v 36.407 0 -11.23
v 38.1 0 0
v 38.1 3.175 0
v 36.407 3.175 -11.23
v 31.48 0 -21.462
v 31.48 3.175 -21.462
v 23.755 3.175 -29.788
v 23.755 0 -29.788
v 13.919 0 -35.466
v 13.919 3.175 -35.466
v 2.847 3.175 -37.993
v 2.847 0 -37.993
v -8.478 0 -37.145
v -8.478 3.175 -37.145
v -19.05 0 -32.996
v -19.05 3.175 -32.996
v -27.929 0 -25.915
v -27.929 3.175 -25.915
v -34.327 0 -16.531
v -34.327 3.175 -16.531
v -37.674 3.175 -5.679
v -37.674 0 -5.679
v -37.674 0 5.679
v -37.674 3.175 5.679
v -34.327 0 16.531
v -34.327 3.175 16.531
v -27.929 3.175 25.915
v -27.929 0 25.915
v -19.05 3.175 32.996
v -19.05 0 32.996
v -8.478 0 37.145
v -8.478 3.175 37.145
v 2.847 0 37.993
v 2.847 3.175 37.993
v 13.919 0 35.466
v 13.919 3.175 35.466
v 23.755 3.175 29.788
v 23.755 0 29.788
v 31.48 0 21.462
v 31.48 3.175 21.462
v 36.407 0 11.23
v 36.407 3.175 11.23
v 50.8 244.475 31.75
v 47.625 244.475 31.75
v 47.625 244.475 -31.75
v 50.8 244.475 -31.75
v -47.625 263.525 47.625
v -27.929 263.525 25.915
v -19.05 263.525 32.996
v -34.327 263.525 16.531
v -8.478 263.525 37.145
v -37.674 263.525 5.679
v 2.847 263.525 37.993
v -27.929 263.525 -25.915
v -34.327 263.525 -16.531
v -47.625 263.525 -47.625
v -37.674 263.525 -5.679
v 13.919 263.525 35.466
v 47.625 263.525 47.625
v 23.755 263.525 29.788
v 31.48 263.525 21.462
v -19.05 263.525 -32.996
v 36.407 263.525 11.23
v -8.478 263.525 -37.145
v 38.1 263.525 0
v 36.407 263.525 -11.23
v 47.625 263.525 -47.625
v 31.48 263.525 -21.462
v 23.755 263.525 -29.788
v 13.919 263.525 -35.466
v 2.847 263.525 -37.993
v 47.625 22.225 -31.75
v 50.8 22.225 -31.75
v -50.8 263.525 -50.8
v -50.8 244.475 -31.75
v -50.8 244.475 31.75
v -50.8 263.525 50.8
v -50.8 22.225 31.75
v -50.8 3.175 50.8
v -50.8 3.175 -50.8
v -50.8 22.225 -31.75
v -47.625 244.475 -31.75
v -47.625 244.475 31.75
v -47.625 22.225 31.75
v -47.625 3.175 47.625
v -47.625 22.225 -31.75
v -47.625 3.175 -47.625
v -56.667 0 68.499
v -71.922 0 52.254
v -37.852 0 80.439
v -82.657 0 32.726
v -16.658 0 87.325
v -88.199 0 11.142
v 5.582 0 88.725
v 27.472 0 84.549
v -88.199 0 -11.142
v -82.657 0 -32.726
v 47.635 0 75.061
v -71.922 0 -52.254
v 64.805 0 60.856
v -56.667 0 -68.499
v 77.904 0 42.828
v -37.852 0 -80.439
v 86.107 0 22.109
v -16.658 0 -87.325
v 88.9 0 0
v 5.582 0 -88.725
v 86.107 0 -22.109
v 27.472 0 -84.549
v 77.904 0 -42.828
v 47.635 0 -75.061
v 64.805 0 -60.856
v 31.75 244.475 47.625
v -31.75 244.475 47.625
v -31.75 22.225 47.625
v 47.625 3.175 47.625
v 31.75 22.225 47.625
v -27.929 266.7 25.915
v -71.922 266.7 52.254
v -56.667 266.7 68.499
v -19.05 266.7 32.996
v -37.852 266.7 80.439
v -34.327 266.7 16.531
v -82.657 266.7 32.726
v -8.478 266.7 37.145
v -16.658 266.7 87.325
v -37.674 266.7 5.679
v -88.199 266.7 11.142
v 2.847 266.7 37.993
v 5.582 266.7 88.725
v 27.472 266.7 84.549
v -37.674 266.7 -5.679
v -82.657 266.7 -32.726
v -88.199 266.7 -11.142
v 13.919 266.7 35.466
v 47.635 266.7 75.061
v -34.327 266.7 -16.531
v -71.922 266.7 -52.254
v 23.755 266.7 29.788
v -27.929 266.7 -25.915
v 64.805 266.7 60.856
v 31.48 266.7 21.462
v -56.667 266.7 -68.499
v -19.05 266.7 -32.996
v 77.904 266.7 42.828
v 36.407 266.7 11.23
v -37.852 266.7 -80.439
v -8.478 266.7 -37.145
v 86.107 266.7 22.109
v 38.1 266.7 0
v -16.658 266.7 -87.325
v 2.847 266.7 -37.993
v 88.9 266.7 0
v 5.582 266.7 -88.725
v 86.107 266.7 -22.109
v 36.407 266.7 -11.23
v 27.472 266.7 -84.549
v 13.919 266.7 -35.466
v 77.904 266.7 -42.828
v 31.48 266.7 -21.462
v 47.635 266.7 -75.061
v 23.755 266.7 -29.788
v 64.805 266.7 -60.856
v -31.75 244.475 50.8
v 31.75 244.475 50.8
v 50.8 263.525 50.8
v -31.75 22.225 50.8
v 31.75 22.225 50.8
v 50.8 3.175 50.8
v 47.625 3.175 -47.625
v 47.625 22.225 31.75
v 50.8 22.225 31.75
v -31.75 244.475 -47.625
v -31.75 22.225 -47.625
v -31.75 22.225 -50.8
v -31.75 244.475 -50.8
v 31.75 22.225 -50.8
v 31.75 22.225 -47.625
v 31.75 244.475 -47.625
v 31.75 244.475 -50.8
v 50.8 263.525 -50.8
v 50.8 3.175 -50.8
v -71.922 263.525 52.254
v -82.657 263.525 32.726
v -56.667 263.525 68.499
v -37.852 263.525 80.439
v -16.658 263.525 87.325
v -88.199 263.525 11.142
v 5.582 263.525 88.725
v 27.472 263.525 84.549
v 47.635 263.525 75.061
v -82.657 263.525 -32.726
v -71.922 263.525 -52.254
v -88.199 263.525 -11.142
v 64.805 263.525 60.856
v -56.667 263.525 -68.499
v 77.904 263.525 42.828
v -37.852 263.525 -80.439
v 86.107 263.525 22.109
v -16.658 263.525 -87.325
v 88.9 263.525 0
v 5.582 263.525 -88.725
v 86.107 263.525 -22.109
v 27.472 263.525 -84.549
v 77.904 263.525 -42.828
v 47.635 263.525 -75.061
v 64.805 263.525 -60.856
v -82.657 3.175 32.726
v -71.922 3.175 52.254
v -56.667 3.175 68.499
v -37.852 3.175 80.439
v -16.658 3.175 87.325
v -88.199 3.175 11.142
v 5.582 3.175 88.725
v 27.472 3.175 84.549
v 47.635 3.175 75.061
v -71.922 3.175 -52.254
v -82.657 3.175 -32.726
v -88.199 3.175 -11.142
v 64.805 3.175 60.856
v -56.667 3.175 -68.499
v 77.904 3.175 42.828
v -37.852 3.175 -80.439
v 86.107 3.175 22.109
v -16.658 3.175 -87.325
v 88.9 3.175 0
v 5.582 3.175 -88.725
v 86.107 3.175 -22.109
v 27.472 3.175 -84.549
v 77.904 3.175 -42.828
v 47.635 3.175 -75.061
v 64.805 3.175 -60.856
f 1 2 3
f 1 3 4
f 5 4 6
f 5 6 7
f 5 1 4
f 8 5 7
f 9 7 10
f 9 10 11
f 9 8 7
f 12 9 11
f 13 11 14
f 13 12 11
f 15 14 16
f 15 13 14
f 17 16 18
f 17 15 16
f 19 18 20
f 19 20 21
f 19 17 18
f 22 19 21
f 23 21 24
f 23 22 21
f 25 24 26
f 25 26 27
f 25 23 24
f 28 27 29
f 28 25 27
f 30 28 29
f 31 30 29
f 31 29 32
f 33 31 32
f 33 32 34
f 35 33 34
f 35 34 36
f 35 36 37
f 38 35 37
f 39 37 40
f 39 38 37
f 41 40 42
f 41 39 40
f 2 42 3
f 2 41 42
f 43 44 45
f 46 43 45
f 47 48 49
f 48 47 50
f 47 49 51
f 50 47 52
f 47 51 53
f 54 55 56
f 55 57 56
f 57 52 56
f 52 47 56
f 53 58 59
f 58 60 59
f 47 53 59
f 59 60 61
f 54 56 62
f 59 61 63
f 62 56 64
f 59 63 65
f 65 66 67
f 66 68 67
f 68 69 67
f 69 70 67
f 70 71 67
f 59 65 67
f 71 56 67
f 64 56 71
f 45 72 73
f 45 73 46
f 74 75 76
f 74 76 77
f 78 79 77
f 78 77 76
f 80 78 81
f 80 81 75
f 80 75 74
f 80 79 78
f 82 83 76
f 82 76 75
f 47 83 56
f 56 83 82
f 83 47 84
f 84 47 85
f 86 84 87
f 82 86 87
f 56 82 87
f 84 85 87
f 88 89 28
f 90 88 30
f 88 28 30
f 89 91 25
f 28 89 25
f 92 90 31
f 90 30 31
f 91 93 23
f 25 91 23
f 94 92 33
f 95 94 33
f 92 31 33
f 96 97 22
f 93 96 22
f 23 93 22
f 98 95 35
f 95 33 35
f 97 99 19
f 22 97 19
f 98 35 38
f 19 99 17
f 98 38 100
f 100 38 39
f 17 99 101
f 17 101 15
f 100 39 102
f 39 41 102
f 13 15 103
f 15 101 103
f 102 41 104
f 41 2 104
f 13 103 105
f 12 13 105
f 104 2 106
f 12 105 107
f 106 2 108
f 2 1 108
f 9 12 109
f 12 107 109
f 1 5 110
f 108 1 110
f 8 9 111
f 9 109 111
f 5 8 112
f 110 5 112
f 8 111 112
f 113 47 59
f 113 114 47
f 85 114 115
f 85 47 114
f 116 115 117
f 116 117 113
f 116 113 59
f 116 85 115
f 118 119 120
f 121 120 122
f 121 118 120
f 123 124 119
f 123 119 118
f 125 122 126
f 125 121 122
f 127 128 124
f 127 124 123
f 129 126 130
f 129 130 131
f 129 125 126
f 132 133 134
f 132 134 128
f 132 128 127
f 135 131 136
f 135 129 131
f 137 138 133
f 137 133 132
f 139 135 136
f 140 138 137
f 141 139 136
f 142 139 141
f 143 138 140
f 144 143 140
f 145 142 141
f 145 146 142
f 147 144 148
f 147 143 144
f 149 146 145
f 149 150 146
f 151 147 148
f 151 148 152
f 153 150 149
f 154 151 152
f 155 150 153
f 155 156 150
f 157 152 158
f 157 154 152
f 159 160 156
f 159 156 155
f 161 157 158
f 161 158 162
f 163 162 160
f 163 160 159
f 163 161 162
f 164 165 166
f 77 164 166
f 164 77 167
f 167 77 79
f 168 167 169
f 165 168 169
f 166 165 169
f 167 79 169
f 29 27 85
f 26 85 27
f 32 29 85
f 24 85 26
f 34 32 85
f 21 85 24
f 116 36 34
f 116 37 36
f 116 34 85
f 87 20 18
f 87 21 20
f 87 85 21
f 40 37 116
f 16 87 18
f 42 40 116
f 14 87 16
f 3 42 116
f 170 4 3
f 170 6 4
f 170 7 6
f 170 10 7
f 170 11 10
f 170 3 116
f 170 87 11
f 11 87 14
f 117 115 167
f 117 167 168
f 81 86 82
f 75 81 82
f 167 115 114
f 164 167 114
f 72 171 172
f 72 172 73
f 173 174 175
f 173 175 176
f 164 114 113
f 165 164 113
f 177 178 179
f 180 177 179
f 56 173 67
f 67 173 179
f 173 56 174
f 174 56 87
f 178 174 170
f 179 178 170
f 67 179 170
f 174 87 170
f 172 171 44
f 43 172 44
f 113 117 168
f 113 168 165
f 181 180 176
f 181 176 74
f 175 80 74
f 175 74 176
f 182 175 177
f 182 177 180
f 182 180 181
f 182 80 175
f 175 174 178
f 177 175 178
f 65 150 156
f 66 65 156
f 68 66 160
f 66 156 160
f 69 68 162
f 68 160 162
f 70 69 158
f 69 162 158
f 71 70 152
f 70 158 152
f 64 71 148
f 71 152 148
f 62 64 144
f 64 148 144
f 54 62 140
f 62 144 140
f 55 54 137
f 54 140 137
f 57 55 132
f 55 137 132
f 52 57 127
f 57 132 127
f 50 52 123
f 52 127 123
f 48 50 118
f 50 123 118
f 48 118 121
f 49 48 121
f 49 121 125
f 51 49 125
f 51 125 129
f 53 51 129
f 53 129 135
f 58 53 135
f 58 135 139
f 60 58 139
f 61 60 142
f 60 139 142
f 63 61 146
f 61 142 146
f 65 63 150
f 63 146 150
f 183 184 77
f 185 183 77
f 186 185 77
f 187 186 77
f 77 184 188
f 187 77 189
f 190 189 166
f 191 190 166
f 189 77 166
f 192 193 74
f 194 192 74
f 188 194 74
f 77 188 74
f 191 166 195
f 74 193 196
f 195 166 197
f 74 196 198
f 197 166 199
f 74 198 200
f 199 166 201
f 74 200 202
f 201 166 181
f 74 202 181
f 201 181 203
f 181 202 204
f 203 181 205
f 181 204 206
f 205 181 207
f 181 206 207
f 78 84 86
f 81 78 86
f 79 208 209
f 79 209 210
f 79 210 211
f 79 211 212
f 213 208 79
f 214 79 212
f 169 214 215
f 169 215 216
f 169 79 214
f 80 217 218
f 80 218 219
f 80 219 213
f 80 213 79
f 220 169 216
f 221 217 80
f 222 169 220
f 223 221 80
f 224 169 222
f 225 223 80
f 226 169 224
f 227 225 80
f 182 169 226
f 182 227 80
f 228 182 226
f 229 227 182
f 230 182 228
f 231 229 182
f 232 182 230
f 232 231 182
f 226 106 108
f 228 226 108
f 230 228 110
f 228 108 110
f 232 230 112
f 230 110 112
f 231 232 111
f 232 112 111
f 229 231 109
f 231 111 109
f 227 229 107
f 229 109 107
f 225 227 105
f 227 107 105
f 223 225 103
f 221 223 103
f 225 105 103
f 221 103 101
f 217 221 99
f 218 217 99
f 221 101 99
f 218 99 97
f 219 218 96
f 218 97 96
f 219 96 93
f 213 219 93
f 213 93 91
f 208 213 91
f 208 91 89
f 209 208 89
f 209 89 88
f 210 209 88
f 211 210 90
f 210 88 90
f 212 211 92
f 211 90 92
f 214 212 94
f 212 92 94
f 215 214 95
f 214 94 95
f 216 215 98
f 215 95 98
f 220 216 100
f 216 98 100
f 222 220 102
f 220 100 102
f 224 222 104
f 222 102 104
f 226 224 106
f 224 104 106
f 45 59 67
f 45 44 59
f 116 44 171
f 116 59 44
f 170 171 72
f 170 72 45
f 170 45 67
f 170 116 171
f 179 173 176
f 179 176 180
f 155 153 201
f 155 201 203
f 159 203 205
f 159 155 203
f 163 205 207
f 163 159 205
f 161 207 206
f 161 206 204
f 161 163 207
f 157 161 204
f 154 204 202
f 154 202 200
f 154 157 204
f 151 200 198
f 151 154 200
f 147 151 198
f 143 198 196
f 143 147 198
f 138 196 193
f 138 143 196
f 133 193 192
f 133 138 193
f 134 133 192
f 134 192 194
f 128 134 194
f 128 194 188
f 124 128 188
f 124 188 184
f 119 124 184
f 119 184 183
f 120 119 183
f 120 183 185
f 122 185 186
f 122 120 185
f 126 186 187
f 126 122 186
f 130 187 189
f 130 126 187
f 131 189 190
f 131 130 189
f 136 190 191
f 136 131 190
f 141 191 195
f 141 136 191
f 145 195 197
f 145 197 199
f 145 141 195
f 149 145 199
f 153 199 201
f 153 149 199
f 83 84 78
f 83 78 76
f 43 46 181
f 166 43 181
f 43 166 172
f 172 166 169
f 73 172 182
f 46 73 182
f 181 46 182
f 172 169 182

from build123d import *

# Parameters (mm, degrees)
SKETCH2_R               = 88.9
SKETCH2_R_2             = 38.1
BOSS_EXTRUDE1_DEPTH     = 3.175
SKETCH2_4_W             = 101.6
SKETCH2_4_H             = 101.6
SKETCH2_4_W_2           = 95.25
SKETCH2_4_H_2           = 95.25
BOSS_EXTRUDE2_DEPTH     = 266.7
SKETCH3_R               = 88.9
SKETCH3_R_2             = 38.1
BOSS_EXTRUDE3_DEPTH     = 3.175
SKETCH4_W               = 63.5
SKETCH4_H               = 222.25
CUT_EXTRUDE1_DEPTH      = 89.9
CUT_EXTRUDE1_DEPTH_BACK = 89.9
SKETCH5_W               = 63.5
SKETCH5_H               = 222.25
CUT_EXTRUDE2_DEPTH      = 89.9
CUT_EXTRUDE2_DEPTH_BACK = 89.9


with BuildPart() as part:
    # Sketch2 → Boss-Extrude1 (new body)
    with BuildSketch(Plane(origin=(0, 0, 0), x_dir=(1, 0, 0), z_dir=(0, 1, 0))):
        Circle(SKETCH2_R)
        Circle(SKETCH2_R_2, mode=Mode.SUBTRACT)
    extrude(amount=BOSS_EXTRUDE1_DEPTH)

    # Sketch2<4> → Boss-Extrude2 (add)
    with BuildSketch(Plane(origin=(0, 0, 0), x_dir=(1, 0, 0), z_dir=(0, 1, 0))):
        Rectangle(SKETCH2_4_W, SKETCH2_4_H)
        Rectangle(SKETCH2_4_W_2, SKETCH2_4_H_2, mode=Mode.SUBTRACT)
    extrude(amount=BOSS_EXTRUDE2_DEPTH)

    # Sketch3 → Boss-Extrude3 (add)
    with BuildSketch(Plane(origin=(0, 266.7, 0), x_dir=(1, 0, 0), z_dir=(0, 1, 0))):
        Circle(SKETCH3_R)
        Circle(SKETCH3_R_2, mode=Mode.SUBTRACT)
    extrude(amount=-BOSS_EXTRUDE3_DEPTH)

    # Sketch4 → Cut-Extrude1 (cut, two sides)
    with BuildSketch(Plane.XY) as cut_extrude1_sk:
        with Locations((0, 133.35)):
            Rectangle(SKETCH4_W, SKETCH4_H)
    extrude(amount=CUT_EXTRUDE1_DEPTH, mode=Mode.SUBTRACT)
    extrude(cut_extrude1_sk.sketch, amount=-CUT_EXTRUDE1_DEPTH_BACK, mode=Mode.SUBTRACT)

    # Sketch5 → Cut-Extrude2 (cut, two sides)
    with BuildSketch(Plane(origin=(0, 0, 0), x_dir=(0, 0, -1), z_dir=(1, 0, 0))) as cut_extrude2_sk:
        with Locations((0, 133.35)):
            Rectangle(SKETCH5_W, SKETCH5_H)
    extrude(amount=CUT_EXTRUDE2_DEPTH, mode=Mode.SUBTRACT)
    extrude(cut_extrude2_sk.sketch, amount=-CUT_EXTRUDE2_DEPTH_BACK, mode=Mode.SUBTRACT)


solid = part.part
